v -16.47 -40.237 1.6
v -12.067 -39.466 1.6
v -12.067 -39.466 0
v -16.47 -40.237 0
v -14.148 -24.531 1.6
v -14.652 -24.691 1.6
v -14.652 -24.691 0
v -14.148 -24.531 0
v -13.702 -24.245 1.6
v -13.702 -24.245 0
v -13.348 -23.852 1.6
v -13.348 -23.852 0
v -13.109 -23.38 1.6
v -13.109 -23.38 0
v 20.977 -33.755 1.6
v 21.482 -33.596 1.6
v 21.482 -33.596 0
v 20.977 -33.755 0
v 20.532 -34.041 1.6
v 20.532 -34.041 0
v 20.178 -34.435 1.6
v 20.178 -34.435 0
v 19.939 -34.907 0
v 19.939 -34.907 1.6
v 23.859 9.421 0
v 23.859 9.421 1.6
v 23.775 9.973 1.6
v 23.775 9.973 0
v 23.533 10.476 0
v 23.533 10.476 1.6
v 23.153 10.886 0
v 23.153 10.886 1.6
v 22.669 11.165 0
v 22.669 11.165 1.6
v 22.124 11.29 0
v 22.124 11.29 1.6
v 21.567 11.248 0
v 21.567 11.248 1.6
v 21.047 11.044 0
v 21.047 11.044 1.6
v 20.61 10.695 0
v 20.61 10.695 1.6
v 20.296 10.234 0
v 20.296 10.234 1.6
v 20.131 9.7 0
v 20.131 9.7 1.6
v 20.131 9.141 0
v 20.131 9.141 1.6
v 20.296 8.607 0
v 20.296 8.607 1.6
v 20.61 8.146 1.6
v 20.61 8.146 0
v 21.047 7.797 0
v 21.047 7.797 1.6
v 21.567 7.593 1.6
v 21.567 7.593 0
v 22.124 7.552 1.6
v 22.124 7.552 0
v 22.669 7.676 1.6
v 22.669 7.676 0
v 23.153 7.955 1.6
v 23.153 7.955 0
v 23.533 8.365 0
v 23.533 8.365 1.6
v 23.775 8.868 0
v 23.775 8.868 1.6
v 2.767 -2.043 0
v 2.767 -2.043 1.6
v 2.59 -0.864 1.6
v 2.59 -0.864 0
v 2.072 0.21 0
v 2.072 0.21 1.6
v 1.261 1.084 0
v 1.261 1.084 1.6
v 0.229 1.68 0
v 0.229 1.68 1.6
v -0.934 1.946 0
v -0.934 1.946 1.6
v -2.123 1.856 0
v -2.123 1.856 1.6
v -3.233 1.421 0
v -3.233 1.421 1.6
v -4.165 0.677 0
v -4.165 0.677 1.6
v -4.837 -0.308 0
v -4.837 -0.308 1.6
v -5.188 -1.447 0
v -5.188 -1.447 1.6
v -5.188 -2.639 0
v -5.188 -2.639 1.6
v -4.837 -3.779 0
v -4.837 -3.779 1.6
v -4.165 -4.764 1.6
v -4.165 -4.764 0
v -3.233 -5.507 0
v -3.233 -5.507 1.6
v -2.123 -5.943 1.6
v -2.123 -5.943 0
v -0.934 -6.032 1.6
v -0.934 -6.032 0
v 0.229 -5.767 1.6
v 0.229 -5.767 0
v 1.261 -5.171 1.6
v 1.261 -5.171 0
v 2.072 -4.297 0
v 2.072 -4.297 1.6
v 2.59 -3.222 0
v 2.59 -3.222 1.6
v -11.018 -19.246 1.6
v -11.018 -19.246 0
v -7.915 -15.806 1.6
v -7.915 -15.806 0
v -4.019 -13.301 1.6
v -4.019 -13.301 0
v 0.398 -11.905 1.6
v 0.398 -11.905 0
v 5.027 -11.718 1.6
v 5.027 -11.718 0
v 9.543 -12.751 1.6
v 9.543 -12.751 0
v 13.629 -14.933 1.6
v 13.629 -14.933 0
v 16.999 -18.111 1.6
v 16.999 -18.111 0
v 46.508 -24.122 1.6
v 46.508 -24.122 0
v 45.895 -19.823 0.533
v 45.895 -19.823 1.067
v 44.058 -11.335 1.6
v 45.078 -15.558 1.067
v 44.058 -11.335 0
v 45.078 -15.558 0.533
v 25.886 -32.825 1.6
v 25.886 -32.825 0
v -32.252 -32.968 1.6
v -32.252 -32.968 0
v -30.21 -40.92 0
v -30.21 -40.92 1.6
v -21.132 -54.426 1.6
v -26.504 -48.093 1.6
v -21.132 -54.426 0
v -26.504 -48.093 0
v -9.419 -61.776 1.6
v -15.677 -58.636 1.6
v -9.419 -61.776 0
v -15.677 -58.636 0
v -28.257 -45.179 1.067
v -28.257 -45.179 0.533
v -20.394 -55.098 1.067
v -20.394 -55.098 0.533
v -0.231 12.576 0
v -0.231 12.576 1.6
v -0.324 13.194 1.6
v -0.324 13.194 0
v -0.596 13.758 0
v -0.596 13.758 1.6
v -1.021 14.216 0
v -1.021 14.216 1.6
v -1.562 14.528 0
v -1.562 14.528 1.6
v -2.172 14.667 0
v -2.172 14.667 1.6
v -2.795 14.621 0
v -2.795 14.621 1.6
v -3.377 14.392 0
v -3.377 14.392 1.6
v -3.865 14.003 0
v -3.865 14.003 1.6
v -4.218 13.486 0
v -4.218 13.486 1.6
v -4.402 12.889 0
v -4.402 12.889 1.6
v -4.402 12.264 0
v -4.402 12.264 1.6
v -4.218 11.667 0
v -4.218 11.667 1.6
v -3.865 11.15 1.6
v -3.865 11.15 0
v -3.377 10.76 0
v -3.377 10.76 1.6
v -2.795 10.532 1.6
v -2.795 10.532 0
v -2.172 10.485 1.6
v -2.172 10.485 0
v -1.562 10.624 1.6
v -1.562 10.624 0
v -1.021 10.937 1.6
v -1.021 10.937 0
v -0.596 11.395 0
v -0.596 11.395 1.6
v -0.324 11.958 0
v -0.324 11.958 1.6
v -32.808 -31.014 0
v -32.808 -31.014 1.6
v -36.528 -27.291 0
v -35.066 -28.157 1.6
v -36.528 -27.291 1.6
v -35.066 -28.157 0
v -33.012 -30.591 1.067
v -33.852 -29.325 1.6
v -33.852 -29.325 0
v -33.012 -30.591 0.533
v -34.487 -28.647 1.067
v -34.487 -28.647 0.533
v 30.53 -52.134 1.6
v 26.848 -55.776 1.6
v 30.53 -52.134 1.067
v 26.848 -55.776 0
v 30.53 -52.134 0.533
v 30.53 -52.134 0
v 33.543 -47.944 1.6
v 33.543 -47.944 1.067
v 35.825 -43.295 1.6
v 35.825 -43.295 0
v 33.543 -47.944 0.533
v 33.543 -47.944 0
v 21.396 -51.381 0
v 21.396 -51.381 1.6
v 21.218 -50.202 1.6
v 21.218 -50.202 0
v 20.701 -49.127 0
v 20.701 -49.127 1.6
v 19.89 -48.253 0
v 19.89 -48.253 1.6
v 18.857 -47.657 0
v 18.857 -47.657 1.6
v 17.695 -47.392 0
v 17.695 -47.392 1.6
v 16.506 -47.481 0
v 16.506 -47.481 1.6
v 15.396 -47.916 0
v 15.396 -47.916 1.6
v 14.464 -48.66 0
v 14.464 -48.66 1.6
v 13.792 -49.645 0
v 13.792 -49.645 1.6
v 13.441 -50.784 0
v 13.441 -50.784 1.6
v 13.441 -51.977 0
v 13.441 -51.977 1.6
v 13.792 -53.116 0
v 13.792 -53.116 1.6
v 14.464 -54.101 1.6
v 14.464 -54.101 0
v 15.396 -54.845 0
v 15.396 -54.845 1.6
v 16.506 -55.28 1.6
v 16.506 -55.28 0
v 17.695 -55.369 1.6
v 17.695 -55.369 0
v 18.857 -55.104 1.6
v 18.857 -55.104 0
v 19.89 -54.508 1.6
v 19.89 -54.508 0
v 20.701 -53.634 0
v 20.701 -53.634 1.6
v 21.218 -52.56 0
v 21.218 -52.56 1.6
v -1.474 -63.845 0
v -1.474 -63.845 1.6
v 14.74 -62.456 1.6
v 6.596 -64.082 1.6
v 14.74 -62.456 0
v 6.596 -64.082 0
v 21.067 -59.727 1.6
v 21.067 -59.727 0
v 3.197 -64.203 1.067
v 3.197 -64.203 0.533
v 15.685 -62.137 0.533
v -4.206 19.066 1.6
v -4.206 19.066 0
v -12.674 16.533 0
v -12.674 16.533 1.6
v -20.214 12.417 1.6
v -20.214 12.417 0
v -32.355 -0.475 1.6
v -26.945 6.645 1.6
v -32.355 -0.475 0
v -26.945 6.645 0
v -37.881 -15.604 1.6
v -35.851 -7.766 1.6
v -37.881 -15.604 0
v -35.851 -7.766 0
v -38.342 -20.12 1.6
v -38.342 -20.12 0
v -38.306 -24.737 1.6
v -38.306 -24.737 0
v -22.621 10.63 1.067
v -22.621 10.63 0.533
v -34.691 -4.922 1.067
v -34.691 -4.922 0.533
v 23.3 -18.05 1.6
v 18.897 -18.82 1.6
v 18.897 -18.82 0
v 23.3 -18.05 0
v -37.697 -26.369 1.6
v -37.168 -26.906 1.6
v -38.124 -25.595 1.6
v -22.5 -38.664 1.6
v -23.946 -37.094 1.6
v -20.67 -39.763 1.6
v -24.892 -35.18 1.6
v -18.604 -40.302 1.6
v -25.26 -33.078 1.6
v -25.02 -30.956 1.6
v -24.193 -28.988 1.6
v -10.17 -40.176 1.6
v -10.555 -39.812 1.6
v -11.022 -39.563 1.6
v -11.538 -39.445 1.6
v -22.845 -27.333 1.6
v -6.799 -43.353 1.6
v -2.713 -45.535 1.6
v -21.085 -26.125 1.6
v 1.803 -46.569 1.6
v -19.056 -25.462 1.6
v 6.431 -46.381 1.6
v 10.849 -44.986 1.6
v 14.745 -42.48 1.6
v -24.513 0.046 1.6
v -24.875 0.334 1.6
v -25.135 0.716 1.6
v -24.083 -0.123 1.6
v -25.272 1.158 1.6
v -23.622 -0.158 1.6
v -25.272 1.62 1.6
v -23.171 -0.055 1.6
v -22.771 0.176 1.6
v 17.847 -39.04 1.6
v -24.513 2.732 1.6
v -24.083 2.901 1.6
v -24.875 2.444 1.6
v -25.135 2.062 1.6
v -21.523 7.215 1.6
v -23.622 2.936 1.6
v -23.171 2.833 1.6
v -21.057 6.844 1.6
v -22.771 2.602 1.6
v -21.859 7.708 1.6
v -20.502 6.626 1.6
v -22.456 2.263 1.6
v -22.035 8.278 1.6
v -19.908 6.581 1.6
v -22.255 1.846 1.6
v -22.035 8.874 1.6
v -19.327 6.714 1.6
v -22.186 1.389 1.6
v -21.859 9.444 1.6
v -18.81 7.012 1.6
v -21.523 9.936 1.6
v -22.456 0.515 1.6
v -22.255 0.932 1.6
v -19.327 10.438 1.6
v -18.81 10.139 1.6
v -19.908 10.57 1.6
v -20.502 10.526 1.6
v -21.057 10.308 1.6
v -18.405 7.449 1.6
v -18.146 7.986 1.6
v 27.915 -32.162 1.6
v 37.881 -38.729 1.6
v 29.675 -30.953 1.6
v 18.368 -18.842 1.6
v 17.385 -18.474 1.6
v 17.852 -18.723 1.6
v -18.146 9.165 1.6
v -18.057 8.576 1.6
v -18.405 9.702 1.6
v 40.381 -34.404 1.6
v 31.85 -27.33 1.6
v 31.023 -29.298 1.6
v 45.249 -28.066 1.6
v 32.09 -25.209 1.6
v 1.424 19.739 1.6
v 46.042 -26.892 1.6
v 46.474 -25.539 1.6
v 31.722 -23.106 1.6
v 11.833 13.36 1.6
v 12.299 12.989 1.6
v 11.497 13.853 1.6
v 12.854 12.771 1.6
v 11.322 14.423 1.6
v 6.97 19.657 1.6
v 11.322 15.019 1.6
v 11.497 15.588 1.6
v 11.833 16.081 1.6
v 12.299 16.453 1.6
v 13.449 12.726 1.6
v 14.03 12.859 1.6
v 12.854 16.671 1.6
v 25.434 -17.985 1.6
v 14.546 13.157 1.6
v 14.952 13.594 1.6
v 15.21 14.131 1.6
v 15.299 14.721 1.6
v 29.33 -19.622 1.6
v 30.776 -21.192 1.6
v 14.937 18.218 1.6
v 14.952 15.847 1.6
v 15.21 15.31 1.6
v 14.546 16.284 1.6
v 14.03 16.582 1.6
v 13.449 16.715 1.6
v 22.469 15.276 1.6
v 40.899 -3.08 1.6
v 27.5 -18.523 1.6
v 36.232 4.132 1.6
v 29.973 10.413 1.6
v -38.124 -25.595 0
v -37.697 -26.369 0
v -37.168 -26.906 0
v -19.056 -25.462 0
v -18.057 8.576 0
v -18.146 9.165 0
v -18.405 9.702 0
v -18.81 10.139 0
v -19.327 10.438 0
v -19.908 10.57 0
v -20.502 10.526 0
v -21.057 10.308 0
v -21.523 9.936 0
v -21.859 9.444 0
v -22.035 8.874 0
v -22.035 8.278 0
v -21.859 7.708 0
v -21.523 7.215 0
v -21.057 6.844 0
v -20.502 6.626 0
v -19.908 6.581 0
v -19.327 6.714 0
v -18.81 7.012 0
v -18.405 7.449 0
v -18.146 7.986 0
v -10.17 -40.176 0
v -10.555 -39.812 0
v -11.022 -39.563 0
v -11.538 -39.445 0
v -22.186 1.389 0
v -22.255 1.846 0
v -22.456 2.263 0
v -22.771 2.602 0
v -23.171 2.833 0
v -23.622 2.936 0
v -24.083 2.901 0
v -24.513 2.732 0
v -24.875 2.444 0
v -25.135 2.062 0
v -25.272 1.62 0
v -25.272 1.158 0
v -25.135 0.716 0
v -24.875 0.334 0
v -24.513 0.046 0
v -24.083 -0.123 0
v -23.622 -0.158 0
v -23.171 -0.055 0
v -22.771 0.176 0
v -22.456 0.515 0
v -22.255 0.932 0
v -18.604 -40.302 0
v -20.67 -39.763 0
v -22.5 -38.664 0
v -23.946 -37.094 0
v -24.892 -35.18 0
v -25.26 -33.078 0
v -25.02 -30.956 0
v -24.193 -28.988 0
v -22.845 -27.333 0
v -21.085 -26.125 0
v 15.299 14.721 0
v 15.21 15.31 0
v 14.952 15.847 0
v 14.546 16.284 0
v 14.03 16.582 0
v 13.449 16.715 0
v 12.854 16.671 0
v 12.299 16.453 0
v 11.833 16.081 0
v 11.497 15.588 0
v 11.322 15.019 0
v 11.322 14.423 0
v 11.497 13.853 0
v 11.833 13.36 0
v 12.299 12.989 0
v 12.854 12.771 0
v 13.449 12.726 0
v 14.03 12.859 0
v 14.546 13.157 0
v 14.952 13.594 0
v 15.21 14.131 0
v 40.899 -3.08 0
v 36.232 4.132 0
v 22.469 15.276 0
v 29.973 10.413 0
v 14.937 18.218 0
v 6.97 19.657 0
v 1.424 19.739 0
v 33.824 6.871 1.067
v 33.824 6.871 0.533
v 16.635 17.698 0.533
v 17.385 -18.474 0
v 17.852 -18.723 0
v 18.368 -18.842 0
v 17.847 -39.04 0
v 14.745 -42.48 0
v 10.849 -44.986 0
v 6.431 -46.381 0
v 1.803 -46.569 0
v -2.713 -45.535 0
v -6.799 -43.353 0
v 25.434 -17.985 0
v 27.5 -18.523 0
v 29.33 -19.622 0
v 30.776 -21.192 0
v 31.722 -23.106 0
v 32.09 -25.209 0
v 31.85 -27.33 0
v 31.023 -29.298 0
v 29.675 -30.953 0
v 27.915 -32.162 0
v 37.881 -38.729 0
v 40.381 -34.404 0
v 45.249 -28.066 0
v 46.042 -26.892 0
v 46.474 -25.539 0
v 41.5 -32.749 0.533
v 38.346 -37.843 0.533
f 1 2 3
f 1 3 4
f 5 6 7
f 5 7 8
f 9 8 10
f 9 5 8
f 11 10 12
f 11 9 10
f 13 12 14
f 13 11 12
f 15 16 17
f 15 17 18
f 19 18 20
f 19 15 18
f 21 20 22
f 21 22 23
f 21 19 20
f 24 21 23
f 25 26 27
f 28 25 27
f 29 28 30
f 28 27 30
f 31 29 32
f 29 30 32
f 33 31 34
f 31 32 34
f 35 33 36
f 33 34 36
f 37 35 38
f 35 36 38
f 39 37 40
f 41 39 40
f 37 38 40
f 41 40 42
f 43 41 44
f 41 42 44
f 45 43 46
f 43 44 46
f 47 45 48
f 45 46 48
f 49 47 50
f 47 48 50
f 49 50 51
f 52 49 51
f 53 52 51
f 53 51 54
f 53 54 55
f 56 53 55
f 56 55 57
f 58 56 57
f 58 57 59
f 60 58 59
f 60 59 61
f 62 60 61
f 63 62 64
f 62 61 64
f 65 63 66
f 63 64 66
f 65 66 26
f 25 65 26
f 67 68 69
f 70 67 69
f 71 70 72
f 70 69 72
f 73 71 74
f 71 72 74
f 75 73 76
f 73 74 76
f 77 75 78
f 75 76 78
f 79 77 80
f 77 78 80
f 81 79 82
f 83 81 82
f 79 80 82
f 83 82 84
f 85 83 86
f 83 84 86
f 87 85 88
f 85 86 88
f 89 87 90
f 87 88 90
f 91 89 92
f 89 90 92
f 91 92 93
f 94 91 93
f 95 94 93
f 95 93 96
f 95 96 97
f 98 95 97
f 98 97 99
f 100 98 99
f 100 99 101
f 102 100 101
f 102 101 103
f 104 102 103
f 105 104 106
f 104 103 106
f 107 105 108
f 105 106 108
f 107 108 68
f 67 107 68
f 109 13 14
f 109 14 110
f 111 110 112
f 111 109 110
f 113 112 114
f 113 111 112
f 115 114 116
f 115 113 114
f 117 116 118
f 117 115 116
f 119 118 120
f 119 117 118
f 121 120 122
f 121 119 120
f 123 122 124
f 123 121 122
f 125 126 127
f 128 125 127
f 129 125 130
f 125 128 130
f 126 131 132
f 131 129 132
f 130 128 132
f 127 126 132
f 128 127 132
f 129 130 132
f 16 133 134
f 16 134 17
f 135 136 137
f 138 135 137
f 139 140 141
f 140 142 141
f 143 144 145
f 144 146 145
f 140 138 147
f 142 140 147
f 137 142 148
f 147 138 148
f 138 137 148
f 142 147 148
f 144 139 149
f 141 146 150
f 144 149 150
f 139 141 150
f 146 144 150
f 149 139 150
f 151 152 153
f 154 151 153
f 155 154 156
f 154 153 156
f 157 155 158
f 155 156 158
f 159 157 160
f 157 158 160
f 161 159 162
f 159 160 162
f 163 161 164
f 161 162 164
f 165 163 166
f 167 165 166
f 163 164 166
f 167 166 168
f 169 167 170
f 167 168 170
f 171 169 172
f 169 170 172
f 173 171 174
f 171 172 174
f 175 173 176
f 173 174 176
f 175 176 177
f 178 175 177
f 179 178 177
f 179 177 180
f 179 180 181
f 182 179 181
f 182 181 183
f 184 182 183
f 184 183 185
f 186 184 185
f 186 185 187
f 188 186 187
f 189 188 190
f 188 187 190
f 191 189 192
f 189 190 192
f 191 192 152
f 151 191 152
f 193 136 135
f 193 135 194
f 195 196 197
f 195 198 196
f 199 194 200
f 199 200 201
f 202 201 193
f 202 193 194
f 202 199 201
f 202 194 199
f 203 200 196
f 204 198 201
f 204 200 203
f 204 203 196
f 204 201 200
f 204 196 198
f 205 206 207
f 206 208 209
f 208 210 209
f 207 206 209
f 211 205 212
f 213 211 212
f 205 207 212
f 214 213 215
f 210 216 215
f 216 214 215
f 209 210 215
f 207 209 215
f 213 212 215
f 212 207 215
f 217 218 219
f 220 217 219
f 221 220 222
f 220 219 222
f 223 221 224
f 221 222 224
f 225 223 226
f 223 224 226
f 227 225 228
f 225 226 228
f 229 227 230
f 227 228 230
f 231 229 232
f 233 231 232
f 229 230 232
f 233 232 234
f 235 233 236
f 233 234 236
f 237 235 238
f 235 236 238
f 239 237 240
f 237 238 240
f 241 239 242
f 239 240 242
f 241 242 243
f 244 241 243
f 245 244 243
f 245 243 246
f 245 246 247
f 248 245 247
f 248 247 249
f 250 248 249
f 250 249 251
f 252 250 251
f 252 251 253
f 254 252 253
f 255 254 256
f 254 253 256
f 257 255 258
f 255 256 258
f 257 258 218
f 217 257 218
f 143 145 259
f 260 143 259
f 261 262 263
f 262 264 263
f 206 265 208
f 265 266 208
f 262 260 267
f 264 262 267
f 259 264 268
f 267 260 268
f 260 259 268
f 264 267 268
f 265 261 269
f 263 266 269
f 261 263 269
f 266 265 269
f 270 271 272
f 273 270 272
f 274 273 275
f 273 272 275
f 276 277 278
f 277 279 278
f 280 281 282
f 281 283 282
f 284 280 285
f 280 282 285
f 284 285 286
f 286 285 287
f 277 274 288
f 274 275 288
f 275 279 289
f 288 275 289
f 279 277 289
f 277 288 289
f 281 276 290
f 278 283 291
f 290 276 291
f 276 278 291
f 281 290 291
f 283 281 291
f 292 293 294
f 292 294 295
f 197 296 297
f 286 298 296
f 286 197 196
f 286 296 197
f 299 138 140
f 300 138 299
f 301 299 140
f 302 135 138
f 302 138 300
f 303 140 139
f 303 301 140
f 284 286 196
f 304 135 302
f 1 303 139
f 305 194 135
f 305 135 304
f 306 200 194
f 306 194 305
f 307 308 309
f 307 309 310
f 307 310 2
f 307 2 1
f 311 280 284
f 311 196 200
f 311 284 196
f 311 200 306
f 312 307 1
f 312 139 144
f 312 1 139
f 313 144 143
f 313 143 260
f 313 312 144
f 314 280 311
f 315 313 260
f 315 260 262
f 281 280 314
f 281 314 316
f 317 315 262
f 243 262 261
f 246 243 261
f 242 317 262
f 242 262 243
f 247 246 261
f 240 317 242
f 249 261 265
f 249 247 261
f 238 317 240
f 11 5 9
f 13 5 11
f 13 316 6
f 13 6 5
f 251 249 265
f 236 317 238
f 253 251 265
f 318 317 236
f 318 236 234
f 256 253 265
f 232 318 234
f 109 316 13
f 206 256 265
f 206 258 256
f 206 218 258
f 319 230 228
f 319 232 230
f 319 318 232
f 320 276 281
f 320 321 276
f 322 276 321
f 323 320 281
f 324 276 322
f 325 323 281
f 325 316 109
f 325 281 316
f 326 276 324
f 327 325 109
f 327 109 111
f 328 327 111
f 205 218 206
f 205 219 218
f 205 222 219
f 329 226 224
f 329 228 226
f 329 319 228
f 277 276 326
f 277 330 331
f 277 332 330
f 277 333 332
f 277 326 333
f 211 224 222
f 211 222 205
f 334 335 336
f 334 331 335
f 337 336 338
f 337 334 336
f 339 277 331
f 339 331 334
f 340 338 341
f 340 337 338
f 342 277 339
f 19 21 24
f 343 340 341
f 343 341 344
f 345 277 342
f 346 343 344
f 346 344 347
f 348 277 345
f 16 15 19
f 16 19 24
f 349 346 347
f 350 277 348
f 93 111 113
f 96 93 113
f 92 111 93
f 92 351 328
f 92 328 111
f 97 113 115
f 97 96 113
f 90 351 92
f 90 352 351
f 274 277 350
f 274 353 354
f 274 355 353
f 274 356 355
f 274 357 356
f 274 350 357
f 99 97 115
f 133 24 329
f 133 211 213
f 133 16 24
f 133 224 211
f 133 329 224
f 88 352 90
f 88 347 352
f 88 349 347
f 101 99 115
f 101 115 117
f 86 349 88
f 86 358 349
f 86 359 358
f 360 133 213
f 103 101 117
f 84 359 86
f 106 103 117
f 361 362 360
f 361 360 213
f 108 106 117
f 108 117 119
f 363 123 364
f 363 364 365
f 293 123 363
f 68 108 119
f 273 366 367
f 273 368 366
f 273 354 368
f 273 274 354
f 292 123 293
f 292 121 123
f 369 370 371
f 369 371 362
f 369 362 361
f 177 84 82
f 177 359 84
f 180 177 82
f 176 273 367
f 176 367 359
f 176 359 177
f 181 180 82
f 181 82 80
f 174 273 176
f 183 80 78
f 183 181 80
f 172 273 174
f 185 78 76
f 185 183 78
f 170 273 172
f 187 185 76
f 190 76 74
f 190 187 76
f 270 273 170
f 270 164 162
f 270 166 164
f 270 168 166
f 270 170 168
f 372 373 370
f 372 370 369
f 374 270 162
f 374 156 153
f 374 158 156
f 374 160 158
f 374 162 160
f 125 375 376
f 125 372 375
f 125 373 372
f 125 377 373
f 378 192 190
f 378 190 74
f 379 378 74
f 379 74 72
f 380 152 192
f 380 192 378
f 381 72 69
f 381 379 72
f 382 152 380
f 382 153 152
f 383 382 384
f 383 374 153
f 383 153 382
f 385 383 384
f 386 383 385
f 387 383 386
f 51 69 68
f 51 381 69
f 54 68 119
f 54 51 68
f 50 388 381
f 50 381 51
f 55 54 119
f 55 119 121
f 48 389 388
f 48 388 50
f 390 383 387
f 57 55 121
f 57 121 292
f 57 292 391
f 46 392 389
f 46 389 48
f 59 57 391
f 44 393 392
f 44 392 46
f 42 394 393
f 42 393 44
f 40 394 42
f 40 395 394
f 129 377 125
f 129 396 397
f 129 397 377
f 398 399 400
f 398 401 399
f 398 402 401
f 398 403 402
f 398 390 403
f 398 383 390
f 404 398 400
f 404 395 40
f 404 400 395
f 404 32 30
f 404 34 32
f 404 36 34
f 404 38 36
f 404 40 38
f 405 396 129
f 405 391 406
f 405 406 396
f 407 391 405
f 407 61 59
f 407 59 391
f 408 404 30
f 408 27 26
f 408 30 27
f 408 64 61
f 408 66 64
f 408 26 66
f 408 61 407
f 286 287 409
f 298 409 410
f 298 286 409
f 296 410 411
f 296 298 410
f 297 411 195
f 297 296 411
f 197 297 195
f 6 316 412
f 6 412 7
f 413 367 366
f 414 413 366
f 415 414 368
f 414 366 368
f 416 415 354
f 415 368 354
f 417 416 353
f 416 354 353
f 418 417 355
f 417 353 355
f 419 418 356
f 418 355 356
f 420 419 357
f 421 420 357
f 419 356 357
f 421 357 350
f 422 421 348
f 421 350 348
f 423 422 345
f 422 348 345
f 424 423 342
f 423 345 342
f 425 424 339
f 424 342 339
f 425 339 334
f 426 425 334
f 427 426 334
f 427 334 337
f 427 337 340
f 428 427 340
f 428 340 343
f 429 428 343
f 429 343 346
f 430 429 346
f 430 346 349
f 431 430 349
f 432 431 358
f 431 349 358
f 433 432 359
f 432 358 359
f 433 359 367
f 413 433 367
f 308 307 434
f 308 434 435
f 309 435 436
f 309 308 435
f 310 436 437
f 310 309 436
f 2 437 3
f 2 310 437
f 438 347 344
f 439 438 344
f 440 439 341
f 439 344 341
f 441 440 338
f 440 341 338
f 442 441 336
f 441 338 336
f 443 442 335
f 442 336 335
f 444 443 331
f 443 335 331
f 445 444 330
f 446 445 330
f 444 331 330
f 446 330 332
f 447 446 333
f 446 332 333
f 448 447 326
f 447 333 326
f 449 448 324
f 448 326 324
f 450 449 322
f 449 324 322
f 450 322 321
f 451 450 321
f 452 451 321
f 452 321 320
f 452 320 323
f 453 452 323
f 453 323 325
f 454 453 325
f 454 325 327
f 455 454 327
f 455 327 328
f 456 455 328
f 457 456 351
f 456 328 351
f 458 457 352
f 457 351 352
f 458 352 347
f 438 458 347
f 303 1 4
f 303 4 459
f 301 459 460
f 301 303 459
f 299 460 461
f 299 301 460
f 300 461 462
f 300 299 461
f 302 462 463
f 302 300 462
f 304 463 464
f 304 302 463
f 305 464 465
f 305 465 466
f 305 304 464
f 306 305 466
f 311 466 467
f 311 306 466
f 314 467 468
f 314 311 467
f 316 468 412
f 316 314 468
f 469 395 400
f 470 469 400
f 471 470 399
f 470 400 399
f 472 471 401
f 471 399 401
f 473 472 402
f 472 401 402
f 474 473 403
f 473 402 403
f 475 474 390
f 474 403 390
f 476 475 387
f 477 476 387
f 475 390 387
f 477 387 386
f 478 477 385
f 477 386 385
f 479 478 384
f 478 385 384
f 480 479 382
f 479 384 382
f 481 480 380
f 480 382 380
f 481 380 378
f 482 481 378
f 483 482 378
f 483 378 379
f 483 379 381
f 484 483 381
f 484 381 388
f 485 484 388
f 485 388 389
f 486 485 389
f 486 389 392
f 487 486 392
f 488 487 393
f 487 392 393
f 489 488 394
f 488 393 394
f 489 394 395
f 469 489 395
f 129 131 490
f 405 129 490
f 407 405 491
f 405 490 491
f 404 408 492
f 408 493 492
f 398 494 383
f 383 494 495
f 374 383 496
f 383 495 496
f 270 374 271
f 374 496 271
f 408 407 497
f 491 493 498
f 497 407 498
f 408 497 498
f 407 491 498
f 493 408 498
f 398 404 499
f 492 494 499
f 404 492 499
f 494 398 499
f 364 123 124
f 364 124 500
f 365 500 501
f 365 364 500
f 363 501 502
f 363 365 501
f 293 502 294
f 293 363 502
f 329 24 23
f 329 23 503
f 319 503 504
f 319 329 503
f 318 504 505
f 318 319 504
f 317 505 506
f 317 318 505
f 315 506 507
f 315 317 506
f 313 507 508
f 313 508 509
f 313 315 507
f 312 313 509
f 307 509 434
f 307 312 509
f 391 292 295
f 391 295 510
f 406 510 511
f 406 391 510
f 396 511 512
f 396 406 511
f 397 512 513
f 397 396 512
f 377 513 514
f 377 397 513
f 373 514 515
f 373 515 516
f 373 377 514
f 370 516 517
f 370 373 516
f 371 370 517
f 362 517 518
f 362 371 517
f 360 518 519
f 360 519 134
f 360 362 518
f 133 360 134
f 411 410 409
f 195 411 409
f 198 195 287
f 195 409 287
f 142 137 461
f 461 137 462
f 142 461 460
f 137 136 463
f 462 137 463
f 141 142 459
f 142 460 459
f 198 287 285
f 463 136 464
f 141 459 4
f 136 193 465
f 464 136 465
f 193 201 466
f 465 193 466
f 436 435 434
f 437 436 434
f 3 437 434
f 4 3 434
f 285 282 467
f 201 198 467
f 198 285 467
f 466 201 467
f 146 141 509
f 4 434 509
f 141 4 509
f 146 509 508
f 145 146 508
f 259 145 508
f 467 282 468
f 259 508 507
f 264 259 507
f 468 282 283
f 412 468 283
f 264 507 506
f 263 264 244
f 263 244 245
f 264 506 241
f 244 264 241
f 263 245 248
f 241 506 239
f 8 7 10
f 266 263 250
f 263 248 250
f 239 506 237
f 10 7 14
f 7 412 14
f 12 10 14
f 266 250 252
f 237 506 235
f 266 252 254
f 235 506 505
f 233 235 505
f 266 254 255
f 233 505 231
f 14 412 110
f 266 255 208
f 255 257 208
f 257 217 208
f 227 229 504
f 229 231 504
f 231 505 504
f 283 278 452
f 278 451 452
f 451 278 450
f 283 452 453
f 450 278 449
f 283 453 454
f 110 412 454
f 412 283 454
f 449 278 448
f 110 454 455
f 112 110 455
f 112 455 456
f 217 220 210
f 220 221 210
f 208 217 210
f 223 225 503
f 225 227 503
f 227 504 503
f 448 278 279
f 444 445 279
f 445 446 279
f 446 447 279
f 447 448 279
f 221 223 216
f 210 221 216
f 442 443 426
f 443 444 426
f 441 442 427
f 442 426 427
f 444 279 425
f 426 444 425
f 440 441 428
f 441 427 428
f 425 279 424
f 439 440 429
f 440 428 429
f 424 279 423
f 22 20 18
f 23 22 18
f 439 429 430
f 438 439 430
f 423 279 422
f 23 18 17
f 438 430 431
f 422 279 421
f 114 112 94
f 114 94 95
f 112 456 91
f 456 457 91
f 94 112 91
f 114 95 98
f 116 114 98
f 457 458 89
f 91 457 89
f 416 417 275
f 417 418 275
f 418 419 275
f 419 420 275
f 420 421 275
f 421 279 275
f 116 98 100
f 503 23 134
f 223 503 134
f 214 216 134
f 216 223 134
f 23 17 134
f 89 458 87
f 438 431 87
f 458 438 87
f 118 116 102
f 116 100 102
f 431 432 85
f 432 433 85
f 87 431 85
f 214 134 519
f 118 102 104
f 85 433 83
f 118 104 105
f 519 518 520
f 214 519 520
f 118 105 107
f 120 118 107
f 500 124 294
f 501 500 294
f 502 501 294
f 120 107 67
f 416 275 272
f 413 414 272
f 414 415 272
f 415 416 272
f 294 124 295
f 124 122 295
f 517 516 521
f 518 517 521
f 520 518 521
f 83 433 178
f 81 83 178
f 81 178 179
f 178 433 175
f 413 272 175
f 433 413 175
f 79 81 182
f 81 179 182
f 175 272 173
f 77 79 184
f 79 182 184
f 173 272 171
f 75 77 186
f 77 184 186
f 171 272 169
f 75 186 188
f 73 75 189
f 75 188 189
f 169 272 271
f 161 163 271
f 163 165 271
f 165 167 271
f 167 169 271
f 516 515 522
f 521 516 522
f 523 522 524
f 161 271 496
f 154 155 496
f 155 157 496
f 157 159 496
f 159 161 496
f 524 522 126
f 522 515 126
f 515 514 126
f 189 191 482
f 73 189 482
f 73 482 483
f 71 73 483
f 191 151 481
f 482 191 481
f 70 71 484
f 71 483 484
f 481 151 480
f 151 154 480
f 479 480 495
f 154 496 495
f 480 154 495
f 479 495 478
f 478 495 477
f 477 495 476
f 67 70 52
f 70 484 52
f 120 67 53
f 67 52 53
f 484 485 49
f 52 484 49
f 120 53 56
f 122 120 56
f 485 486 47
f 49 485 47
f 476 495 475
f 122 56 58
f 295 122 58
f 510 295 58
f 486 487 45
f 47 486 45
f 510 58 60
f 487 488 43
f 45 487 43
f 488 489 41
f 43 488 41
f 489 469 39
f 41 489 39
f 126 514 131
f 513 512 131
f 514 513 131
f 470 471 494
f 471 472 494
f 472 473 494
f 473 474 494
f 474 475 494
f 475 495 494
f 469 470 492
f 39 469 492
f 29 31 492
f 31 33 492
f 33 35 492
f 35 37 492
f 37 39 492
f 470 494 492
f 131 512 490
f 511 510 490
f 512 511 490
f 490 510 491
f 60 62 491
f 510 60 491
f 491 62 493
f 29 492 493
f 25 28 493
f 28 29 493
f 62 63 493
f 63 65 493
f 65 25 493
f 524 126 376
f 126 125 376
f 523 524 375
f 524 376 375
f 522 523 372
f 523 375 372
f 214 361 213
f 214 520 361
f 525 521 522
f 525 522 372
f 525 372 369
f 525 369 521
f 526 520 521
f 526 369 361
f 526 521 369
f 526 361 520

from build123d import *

# Parameters (mm, degrees)
BOSS_EXTRUDE1_DEPTH = 1.6
SKETCH2_R           = 4
SKETCH2_R_2         = 2
SKETCH2_R_3         = 1.551240763
SKETCH2_R_4         = 2.096920304
SKETCH2_R_5         = 1.874340877
CUT_EXTRUDE1_DEPTH  = 1.6
FILLET1_R           = 3
FILLET2_R           = 5


with BuildPart() as part:
    # Model → Boss-Extrude1 (new body)
    with BuildSketch(Plane.XY):
        with BuildLine():
            add(Edge.make_bspline(
                [(44.0581, -11.3354), (38.4033, 9.8661), (17.3587, 23.1222), (-4.2058, 19.0663)],
                knots=[0, 0, 0, 0, 0.333333333, 0.333333333, 0.333333333, 0.333333333], degree=3))
            add(Edge.make_bspline(
                [(-4.2058, 19.0663), (-25.7703, 15.0105), (-40.5609, -4.9853), (-38.1268, -26.7925)],
                knots=[0.333333333, 0.333333333, 0.333333333, 0.333333333, 1, 1, 1, 1], degree=3))
            add(Edge.make_bspline(
                [(-32.2525, -32.9684), (-32.6837, -29.8631), (-35.047, -27.3785), (-38.1268, -26.7925)],
                knots=[0, 0, 0, 0, 1, 1, 1, 1], degree=3))
            add(Edge.make_bspline(
                [(-32.2525, -32.9684), (-30.442, -46.0069), (-21.6996, -57.0365), (-9.4187, -61.7758)],
                knots=[0, 0, 0, 0, 0.333333333, 0.333333333, 0.333333333, 0.333333333], degree=3))
            add(Edge.make_bspline(
                [(-9.4187, -61.7758), (2.8622, -66.5152), (16.7476, -64.218), (26.8478, -55.776)],
                knots=[0.333333333, 0.333333333, 0.333333333, 0.333333333, 1, 1, 1, 1], degree=3))
            add(Edge.make_bspline(
                [(26.8478, -55.776), (30.8425, -52.4371), (33.9303, -48.1443), (35.8253, -43.295)],
                knots=[0, 0, 0, 0, 1, 1, 1, 1], degree=3))
            add(Edge.make_bspline(
                [(46.7562, -26.4745), (42.0043, -31.2778), (38.2846, -37.0019), (35.8253, -43.295)],
                knots=[0, 0, 0, 0, 1, 1, 1, 1], degree=3))
            add(Edge.make_bspline(
                [(46.7562, -26.4745), (46.284, -21.3612), (45.3815, -16.2969), (44.0581, -11.3354)],
                knots=[0, 0, 0, 0, 1, 1, 1, 1], degree=3))
        make_face()
    extrude(amount=BOSS_EXTRUDE1_DEPTH)

    # Sketch2 → Cut-Extrude1 (cut)
    with BuildSketch(Plane.XY.offset(1.6)):
        with Locations((17.3961, -51.3806)):
            Circle(SKETCH2_R)
        with Locations((-1.2327, -2.0433)):
            Circle(SKETCH2_R)
        with Locations((-20.0573, 8.5758)):
            Circle(SKETCH2_R_2)
        with Locations((13.2993, 14.7207)):
            Circle(SKETCH2_R_2)
        with Locations((-23.737719808, 1.389021653)):
            Circle(SKETCH2_R_3)
        with Locations((-2.328258131, 12.576412767)):
            Circle(SKETCH2_R_4)
        with Locations((21.984264555, 9.420615455)):
            Circle(SKETCH2_R_5)
        with BuildLine():
            Line((-19.056077425, -25.461514873), (-14.652380487, -24.690905022))
            ThreePointArc((-14.652380487, -24.690905022), (-13.702265565, -24.245091556), (-13.108712216, -23.379549857))
            ThreePointArc((-13.108712216, -23.379549857), (0.398385158, -11.905192157), (16.999343908, -18.110893783))
            ThreePointArc((16.999343908, -18.110893783), (17.85155014, -18.723439741), (18.896596337, -18.820116826))
            Line((18.896596337, -18.820116826), (23.300293275, -18.049506976))
            ThreePointArc((23.300293275, -18.049506976), (31.980824426, -24.144453977), (25.885877425, -32.824985127))
            Line((25.885877425, -32.824985127), (21.482180487, -33.595594978))
            ThreePointArc((21.482180487, -33.595594978), (20.532065565, -34.041408444), (19.938512216, -34.906950143))
            ThreePointArc((19.938512216, -34.906950143), (6.431414842, -46.381307843), (-10.169543908, -40.175606217))
            ThreePointArc((-10.169543908, -40.175606217), (-11.02175014, -39.563060259), (-12.066796337, -39.466383174))
            Line((-12.066796337, -39.466383174), (-16.470493275, -40.236993024))
            ThreePointArc((-16.470493275, -40.236993024), (-25.151024426, -34.142046023), (-19.056077425, -25.461514873))
        make_face()
    extrude(amount=-CUT_EXTRUDE1_DEPTH, mode=Mode.SUBTRACT)

    # Fillet1
    fillet1_edges = [part.edges().sort_by_distance(p)[0] for p in [
        (-38.1268, -26.7925, 0.8),
    ]]
    fillet(fillet1_edges, radius=FILLET1_R)

    # Fillet2
    fillet2_edges = [part.edges().sort_by_distance(p)[0] for p in [
        (46.7562, -26.4745, 0.8),
    ]]
    fillet(fillet2_edges, radius=FILLET2_R)


solid = part.part
